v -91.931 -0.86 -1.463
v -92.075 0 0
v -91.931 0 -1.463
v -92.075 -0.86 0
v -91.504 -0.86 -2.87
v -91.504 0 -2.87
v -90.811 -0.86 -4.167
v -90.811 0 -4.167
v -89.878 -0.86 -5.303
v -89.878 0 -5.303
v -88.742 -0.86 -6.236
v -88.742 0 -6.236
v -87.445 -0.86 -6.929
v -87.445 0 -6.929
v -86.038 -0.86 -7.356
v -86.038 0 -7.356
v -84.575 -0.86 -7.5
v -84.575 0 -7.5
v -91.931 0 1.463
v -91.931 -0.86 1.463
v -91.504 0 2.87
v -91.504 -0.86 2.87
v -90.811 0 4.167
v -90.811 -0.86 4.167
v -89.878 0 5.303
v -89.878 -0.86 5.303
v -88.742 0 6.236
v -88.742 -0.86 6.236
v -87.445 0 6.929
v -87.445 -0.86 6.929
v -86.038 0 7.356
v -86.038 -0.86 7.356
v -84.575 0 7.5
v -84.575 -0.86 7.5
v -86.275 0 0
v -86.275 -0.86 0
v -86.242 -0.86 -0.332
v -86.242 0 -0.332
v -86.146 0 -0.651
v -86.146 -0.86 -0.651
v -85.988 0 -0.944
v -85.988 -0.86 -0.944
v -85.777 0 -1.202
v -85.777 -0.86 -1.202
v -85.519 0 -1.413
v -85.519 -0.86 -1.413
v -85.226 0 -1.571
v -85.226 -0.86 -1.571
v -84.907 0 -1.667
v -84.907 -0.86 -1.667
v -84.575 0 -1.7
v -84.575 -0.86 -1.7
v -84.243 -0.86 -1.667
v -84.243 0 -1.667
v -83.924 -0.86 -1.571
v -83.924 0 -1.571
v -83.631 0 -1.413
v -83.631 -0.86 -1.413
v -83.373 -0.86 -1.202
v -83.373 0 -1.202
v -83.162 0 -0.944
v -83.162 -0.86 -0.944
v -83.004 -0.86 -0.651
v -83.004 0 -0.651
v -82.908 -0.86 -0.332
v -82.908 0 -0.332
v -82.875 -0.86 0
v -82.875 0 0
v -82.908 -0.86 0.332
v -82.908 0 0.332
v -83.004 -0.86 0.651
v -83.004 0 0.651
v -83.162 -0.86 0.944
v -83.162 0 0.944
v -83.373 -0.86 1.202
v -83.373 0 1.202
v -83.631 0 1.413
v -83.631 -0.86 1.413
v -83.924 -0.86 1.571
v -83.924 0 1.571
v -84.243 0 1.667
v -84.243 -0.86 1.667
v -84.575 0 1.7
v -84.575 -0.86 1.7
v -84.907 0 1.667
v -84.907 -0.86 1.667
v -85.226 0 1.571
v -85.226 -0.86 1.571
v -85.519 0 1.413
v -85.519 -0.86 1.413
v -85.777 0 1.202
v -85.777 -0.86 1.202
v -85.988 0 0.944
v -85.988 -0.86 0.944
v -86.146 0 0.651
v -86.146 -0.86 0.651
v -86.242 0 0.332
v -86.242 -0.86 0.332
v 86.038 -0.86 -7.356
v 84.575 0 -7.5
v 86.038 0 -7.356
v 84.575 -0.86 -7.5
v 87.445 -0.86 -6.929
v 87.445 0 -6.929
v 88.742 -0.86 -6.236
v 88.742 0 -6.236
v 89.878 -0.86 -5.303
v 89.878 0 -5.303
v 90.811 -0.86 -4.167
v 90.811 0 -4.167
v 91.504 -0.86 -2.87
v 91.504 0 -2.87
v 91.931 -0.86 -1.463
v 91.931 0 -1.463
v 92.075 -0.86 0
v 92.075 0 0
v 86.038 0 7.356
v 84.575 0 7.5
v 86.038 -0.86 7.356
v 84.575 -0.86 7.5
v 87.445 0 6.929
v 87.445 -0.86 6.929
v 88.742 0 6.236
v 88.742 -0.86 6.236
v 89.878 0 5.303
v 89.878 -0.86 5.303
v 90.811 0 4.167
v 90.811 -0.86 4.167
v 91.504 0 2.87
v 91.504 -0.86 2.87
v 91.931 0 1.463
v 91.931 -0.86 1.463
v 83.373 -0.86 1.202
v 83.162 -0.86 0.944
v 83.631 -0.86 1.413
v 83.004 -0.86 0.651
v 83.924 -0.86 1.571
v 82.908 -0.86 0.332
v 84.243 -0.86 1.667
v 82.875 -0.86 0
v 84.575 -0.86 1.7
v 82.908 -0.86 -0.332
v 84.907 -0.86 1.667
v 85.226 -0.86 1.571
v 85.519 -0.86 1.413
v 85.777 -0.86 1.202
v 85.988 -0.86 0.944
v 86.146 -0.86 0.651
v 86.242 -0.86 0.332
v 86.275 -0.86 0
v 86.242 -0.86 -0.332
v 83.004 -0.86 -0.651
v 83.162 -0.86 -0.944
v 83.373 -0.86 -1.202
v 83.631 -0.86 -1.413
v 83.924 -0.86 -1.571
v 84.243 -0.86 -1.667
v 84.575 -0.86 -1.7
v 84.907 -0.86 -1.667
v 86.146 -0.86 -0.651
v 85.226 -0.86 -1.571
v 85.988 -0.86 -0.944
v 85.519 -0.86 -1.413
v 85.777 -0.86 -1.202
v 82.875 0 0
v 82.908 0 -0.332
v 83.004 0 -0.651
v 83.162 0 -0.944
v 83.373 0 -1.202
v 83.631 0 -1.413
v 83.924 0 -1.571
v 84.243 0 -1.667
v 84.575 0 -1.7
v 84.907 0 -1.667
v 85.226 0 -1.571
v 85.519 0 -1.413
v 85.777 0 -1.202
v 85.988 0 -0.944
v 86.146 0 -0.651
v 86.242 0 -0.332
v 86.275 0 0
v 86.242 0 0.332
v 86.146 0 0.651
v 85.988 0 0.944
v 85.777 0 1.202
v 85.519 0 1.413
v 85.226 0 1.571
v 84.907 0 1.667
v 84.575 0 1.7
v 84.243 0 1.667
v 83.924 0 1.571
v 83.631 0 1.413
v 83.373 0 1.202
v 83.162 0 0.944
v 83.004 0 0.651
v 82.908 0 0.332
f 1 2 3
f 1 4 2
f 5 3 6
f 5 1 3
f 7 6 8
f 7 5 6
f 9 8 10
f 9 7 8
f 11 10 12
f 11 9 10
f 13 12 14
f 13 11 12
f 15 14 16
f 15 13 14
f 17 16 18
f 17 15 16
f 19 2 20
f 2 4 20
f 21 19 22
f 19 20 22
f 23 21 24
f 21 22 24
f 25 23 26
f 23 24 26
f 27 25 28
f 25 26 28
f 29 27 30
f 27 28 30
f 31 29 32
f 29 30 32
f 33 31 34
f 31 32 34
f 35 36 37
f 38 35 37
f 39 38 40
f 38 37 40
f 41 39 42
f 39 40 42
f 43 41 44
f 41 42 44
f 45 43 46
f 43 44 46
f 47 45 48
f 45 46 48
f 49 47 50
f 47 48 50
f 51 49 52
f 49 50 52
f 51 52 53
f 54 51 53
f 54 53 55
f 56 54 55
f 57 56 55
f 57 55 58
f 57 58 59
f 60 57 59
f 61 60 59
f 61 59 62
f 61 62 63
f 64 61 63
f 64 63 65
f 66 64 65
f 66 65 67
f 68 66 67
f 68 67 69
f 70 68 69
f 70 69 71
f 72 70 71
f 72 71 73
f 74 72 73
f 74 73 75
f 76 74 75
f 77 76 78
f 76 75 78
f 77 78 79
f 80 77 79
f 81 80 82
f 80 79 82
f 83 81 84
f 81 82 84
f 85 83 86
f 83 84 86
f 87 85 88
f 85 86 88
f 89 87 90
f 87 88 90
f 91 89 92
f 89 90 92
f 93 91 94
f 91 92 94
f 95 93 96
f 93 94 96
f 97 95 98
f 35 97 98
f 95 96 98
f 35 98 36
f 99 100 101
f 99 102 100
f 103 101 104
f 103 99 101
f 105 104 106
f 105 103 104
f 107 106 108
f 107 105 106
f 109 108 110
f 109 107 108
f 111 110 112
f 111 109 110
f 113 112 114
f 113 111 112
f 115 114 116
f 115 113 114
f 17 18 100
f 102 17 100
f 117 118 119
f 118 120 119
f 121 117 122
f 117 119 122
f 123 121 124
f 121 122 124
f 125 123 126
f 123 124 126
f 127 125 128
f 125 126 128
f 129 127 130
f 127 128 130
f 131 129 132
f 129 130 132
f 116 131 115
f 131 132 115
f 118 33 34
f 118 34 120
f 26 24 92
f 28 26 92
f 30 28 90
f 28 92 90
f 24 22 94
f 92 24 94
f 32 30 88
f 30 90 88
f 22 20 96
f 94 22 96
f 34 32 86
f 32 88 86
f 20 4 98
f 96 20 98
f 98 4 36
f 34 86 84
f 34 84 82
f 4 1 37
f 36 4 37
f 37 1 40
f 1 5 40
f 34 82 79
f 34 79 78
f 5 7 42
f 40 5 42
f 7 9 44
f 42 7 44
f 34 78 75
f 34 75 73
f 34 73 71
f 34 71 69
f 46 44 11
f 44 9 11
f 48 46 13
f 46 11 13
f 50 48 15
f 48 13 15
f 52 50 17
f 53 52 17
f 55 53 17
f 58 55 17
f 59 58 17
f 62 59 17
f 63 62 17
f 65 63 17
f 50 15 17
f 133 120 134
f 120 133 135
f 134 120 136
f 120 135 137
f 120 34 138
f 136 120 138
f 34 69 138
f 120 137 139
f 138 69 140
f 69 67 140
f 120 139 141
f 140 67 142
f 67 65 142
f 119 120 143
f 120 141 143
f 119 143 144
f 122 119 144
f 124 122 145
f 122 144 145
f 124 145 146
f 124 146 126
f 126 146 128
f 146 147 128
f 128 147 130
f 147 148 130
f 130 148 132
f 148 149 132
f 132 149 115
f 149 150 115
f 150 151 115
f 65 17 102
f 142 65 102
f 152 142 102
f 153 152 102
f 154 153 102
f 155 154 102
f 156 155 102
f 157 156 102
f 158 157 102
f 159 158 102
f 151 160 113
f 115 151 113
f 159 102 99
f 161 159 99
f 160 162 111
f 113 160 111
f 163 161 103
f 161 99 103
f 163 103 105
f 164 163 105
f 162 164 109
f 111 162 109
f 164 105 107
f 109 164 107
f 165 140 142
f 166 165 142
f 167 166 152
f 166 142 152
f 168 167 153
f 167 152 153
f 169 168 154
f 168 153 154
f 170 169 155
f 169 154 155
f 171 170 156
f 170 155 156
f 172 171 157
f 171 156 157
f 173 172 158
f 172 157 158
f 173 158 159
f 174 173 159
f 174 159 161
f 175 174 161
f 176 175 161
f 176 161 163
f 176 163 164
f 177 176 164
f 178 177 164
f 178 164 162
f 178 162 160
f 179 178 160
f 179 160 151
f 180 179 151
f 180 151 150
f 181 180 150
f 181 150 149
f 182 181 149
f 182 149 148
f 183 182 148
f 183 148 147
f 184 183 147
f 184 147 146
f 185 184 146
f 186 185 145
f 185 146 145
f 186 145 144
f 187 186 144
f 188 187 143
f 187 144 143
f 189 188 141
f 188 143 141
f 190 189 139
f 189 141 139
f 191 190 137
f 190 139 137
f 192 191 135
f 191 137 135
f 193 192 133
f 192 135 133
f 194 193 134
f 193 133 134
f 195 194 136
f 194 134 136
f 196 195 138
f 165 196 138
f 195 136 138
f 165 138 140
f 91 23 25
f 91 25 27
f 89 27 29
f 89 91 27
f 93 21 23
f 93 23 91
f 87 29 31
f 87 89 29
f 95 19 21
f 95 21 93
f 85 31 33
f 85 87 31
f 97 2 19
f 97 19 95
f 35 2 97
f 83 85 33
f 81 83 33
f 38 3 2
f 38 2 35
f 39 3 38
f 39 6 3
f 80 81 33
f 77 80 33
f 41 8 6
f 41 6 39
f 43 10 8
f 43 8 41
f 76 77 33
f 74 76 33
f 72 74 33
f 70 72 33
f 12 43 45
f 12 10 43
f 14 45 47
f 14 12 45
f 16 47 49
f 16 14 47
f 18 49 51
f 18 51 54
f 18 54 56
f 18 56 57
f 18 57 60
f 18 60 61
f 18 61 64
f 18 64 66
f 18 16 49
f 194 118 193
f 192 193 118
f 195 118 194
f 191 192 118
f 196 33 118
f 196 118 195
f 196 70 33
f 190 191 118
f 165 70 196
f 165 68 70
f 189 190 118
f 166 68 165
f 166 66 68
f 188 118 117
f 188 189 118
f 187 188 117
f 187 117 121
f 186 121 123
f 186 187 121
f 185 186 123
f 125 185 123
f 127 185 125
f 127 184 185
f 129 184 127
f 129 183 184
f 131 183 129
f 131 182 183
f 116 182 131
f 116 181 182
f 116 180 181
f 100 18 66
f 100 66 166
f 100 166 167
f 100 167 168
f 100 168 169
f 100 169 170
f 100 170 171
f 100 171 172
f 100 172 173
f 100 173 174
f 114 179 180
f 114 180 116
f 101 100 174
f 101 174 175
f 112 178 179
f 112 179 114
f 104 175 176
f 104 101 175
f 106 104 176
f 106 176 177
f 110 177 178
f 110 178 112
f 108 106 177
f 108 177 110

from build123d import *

# Parameters (mm, degrees)
SKETCH2_W                = 184.15
SKETCH2_H                = 15
BASE_FLANGE1_DEPTH       = 0.86
M3_CLEARANCE_HOLE1_D     = 3.4
M3_CLEARANCE_HOLE1_DEPTH = 1.29
M3_CLEARANCE_HOLE1_TIP   = 1.021463052
FILLET1_R                = 7.5


# Sheet-metal steps are written as plain solids
with BuildPart() as part:
    # Sketch2 → Base-Flange1 (new body)
    with BuildSketch(Plane(origin=(0, 0, 0), x_dir=(1, 0, 0), z_dir=(0, 1, 0))):
        Rectangle(SKETCH2_W, SKETCH2_H)
    extrude(amount=-BASE_FLANGE1_DEPTH)

    # M3 Clearance Hole1
    with Locations(Plane(origin=(0, 0, 0), x_dir=(1, 0, 0), z_dir=(0, 1, 0))):
        with Locations((-84.575, 0), (84.575, 0)):
            Hole(M3_CLEARANCE_HOLE1_D / 2, depth=M3_CLEARANCE_HOLE1_DEPTH)
            with Locations((0, 0, -(M3_CLEARANCE_HOLE1_DEPTH + M3_CLEARANCE_HOLE1_TIP / 2))):  # 118° drill point
                Cone(0, M3_CLEARANCE_HOLE1_D / 2, M3_CLEARANCE_HOLE1_TIP, mode=Mode.SUBTRACT)

    # Fillet1
    fillet1_edges = [part.edges().sort_by_distance(p)[0] for p in [
        (92.075, -0.43, 7.5),
        (92.075, -0.43, -7.5),
        (-92.075, -0.43, 7.5),
        (-92.075, -0.43, -7.5),
    ]]
    fillet(fillet1_edges, radius=FILLET1_R - 0.0001)  # a hair under: the kernel refuses the full size


solid = part.part
